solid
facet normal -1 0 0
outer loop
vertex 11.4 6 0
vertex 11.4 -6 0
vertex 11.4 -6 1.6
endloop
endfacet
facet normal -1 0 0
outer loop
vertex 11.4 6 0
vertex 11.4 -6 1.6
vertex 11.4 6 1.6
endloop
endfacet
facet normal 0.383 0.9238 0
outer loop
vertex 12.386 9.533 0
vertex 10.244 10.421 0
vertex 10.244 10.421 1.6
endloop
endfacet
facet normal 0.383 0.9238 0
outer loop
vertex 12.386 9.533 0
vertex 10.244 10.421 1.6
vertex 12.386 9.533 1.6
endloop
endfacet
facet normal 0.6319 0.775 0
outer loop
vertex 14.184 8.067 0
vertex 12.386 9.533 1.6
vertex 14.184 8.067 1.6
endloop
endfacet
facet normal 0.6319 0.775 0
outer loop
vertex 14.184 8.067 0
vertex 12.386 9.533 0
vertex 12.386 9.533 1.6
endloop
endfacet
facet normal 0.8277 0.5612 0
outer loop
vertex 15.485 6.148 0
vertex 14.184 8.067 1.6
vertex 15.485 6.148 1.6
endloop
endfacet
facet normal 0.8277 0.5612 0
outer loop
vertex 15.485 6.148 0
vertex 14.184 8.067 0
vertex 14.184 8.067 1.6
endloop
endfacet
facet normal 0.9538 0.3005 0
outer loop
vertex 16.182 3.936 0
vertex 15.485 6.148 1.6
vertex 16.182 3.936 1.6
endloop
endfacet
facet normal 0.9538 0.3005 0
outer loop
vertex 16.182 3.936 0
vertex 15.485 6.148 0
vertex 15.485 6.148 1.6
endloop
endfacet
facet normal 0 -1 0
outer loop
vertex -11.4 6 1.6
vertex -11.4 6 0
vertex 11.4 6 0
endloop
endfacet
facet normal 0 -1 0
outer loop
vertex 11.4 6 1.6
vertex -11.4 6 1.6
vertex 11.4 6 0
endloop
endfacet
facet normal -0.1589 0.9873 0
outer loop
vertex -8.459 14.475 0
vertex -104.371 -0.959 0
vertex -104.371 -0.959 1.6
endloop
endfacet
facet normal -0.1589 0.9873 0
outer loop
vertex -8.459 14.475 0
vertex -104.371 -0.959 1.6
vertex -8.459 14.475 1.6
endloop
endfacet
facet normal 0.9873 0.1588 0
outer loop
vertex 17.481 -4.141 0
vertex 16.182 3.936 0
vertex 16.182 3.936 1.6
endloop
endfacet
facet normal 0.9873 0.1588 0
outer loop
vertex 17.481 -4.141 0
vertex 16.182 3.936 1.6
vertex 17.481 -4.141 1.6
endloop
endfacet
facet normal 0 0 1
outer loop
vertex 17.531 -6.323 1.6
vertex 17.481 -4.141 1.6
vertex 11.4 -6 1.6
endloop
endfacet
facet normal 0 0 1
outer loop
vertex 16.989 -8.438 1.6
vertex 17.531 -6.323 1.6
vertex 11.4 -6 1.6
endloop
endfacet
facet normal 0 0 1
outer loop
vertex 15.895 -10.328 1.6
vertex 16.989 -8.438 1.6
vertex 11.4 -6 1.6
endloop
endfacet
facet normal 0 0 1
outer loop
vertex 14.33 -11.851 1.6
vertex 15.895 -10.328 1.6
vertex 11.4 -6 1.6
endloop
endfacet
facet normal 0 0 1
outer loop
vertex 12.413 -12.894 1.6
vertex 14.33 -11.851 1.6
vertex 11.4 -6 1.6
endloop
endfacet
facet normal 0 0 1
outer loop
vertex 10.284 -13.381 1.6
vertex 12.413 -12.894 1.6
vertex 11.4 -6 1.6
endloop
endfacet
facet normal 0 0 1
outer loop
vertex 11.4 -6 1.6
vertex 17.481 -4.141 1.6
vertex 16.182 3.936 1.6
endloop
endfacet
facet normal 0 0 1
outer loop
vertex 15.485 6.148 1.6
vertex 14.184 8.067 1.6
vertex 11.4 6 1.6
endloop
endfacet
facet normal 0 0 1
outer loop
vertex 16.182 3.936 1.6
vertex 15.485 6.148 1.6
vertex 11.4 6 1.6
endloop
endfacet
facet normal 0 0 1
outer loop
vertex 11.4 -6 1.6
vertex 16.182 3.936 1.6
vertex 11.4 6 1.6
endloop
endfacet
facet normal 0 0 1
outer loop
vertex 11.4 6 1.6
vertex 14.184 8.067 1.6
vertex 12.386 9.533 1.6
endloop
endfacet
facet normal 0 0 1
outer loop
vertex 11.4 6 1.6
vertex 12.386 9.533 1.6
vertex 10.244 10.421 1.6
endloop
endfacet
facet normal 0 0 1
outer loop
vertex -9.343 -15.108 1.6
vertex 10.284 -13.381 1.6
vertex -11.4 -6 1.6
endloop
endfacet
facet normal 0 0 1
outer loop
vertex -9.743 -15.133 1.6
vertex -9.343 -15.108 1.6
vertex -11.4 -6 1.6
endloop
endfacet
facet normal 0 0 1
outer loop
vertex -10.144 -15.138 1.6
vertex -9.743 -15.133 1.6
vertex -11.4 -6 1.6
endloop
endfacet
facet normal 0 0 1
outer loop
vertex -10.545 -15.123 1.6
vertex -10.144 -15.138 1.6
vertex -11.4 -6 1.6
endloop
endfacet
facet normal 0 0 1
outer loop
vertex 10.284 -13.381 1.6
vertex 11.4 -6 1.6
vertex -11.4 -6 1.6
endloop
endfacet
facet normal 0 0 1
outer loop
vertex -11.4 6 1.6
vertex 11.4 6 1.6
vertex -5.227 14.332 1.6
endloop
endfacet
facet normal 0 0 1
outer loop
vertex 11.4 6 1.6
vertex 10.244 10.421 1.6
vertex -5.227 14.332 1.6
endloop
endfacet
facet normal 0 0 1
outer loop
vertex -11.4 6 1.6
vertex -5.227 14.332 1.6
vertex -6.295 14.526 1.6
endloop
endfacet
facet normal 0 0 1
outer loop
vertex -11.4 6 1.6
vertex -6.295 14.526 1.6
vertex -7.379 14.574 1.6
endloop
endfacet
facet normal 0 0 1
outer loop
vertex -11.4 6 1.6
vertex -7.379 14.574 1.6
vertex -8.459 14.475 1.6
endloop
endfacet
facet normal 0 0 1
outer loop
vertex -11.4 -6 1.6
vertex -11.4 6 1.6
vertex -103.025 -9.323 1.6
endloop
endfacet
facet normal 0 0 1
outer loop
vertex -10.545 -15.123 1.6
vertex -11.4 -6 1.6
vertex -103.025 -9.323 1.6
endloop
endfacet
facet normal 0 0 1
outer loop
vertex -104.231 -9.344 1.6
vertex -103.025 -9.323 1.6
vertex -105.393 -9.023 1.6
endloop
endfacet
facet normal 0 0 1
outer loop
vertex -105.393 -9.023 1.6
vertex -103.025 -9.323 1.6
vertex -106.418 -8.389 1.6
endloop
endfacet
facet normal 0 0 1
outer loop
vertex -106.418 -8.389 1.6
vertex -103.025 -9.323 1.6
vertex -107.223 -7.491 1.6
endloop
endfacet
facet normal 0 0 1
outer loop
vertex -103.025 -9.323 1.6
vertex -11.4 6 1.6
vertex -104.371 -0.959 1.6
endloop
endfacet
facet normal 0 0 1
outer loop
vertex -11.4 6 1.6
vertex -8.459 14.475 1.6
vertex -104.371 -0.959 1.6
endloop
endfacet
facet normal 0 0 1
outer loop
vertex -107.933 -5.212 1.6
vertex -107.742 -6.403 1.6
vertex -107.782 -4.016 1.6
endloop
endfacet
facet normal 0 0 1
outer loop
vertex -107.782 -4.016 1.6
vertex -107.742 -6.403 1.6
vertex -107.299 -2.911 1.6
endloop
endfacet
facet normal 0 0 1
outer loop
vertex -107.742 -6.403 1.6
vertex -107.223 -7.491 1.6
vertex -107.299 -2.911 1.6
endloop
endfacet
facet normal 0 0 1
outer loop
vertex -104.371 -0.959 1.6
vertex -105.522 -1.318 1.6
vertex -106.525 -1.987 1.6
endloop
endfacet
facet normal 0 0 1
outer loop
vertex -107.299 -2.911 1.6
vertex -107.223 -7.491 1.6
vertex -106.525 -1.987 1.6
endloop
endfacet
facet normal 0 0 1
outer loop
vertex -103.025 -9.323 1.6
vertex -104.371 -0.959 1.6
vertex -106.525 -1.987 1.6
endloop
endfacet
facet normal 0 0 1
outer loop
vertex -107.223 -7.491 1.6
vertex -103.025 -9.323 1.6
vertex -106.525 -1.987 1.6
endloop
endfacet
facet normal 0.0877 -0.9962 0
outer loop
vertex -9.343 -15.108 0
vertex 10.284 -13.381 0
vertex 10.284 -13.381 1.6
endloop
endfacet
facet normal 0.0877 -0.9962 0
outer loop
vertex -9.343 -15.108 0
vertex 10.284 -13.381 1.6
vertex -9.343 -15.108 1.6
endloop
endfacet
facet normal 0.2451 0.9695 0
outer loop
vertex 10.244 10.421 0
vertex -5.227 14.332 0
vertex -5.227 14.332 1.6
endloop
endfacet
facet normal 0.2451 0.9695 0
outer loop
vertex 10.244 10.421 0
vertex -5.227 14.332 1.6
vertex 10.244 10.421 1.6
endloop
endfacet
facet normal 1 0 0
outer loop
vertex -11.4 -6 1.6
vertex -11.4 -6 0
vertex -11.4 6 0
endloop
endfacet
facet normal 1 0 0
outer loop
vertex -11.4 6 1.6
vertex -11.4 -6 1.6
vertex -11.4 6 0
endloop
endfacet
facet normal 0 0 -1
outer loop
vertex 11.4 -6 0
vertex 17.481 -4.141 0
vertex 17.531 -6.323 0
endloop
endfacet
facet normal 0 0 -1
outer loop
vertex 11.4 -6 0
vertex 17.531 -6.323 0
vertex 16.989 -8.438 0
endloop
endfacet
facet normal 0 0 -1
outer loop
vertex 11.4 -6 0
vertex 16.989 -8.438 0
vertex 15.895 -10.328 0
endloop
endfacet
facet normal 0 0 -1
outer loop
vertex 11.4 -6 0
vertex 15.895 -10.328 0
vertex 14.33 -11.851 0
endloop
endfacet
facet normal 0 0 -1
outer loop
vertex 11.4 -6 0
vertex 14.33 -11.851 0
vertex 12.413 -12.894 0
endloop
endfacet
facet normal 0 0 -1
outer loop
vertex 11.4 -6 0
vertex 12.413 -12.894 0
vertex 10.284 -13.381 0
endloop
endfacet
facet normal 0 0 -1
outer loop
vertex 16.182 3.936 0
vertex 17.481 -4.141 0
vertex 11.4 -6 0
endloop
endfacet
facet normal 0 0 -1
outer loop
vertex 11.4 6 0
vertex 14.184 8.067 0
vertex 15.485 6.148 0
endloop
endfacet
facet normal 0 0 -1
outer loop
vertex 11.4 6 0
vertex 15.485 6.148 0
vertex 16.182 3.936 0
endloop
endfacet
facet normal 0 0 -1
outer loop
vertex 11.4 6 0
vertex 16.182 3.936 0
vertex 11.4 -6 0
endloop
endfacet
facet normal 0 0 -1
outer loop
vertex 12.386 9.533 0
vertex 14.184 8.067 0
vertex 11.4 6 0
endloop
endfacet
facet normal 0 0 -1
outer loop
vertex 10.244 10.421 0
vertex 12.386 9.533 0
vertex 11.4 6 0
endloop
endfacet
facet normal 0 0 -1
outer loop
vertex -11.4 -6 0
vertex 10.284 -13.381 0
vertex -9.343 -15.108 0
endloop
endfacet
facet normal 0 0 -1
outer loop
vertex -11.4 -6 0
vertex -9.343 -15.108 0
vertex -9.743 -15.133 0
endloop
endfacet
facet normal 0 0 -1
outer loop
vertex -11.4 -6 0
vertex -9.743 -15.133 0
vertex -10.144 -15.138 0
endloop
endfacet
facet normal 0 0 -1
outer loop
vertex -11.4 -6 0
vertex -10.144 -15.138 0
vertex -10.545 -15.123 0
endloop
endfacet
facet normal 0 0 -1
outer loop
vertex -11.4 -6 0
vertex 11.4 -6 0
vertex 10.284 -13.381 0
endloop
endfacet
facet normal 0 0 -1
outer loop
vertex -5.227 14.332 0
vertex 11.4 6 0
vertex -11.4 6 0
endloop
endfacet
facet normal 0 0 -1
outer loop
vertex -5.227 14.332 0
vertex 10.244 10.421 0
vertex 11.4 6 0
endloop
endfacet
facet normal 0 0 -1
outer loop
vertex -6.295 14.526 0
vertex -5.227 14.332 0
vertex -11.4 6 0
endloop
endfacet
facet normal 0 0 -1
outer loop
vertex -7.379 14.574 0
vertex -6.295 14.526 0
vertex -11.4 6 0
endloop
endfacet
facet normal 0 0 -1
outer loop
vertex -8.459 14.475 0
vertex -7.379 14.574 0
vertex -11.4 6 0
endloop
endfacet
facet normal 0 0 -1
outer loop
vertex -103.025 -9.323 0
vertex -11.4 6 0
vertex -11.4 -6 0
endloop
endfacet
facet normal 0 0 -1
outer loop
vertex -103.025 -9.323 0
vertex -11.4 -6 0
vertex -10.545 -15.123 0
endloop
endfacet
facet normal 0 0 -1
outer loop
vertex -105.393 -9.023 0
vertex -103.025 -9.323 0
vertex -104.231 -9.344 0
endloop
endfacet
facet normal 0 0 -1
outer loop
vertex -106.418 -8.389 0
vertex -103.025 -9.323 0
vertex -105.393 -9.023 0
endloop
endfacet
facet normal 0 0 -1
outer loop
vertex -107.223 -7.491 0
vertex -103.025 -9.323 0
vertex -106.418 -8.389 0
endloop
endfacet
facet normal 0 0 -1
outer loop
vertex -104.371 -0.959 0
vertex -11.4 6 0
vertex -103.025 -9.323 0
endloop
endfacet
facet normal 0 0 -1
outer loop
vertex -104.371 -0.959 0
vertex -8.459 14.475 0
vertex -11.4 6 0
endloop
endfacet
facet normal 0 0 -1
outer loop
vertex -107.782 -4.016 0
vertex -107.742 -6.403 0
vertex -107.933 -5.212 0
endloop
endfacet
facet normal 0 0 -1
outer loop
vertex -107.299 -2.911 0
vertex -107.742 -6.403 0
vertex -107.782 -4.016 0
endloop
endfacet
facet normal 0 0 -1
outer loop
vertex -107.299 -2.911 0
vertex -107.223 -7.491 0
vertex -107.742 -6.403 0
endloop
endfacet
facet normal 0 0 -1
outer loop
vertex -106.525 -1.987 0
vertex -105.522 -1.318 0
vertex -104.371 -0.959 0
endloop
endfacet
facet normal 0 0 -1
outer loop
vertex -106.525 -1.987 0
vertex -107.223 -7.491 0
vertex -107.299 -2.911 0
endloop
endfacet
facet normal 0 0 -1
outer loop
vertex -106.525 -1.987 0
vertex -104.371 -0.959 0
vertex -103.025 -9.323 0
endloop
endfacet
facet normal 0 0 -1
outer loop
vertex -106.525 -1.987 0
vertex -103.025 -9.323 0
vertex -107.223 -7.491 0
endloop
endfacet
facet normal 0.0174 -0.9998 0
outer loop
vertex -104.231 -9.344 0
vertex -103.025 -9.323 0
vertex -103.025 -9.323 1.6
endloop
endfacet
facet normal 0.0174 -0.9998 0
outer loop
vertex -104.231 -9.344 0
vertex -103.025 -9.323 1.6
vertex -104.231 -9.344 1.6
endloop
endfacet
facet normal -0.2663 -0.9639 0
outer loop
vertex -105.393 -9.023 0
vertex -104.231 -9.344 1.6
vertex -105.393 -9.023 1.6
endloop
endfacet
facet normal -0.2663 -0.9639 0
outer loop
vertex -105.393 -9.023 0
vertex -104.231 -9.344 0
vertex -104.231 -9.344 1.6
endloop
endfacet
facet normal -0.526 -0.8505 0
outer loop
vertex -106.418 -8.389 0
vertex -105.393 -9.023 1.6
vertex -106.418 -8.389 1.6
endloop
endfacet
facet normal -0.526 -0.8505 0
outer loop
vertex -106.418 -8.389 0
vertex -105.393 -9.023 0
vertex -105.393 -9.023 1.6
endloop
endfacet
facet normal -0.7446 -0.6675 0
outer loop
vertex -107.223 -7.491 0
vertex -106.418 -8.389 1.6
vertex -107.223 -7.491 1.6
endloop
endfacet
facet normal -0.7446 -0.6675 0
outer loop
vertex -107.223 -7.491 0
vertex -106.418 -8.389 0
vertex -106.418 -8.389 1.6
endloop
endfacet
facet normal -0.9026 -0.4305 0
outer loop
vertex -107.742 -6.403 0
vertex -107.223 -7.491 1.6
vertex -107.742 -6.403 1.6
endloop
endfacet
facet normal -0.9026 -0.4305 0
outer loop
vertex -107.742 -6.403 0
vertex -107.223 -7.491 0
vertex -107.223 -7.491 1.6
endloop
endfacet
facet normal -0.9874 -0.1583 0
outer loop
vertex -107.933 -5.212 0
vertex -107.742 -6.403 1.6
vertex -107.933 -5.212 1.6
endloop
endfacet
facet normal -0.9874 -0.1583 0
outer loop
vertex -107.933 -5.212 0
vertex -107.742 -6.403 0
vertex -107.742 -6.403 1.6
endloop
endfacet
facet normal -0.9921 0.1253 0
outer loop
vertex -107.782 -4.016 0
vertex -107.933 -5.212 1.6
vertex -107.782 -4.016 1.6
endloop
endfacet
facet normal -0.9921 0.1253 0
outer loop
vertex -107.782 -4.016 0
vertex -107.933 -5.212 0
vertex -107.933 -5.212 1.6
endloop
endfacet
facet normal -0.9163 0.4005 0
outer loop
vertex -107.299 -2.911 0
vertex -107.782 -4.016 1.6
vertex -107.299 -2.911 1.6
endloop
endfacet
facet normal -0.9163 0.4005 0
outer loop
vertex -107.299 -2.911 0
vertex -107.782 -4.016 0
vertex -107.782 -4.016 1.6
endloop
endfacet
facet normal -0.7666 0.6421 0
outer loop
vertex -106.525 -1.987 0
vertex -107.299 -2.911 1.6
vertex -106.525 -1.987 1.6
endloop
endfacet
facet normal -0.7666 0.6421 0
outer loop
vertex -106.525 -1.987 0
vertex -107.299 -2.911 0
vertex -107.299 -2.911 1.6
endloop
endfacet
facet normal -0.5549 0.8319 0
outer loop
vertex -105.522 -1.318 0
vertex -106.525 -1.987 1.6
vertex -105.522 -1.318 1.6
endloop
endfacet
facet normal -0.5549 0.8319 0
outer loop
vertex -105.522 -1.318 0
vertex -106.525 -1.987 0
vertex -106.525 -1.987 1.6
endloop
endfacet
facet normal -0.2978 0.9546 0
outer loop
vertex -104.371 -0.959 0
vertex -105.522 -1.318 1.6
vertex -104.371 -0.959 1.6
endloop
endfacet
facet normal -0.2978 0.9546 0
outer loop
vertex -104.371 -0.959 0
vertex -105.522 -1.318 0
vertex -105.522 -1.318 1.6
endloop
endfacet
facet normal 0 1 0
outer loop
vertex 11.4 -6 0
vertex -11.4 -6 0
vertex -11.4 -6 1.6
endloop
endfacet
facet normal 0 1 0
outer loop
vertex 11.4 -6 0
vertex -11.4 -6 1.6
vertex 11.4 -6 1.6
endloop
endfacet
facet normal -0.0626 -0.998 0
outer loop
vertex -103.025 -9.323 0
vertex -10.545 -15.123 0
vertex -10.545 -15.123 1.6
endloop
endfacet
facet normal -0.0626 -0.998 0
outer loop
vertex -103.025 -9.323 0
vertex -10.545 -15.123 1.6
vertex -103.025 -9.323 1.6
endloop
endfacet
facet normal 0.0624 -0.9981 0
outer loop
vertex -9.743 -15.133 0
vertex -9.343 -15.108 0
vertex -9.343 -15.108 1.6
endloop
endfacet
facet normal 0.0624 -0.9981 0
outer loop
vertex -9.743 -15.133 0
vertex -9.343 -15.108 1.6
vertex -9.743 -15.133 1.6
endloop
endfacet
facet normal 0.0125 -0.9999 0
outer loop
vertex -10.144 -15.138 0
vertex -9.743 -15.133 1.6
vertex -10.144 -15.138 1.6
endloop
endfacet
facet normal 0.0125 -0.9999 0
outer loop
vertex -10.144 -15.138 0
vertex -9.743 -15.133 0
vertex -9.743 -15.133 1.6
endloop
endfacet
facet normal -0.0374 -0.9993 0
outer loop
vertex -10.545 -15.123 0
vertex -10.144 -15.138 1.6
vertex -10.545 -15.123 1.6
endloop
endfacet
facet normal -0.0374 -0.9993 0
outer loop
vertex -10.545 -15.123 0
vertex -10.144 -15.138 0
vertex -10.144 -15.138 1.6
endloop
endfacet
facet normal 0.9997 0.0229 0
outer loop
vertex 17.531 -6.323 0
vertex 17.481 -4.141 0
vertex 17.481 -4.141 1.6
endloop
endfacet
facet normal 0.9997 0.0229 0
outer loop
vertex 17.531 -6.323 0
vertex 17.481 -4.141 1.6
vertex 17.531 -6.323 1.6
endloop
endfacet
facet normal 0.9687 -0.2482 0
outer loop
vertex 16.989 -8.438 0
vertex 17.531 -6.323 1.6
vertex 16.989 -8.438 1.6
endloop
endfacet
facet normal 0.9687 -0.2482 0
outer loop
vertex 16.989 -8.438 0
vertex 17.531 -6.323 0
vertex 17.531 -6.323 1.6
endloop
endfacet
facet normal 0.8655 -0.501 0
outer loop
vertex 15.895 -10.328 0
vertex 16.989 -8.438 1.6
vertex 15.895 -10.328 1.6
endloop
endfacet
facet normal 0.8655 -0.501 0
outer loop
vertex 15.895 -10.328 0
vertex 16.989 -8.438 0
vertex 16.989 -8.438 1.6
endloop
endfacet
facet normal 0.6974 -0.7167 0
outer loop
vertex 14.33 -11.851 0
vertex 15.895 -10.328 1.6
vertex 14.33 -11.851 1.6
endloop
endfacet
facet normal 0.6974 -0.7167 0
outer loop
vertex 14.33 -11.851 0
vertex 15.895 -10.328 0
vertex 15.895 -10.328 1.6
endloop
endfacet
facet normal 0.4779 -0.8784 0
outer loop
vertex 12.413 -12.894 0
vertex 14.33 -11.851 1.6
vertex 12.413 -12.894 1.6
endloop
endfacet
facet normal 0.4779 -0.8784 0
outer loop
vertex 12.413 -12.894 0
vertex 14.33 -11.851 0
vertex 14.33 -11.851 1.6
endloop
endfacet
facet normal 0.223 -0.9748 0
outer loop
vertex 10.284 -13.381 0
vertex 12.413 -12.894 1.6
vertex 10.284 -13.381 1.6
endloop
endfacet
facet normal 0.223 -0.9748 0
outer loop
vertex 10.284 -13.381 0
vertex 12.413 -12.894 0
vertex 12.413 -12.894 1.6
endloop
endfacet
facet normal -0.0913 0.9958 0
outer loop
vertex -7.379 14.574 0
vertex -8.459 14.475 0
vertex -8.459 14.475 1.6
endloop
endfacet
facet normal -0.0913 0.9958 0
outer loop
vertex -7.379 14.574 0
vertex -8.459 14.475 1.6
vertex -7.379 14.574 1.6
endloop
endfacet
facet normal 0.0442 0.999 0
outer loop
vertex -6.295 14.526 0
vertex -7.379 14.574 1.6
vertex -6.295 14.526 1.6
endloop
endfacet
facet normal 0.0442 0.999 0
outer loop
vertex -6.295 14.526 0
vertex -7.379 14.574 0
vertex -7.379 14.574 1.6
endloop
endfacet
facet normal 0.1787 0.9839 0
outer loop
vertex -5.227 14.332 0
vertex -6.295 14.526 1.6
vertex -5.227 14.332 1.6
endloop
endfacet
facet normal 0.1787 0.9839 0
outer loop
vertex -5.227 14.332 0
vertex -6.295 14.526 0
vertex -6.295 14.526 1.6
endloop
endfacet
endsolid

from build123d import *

# Parameters (mm, degrees)
ESBO_O1_W                = 22.8
ESBO_O1_H                = 12
RESSALTO_EXTRUS_O1_DEPTH = 1.6


with BuildPart() as part:
    # Esboço1 → Ressalto-extrusão1 (new body)
    with BuildSketch(Plane.XY):
        with BuildLine():
            Line((-104.371088502, -0.959412185), (-8.45923057, 14.474679896))
            ThreePointArc((-8.45923057, 14.474679896), (-6.836063531, 14.568536185), (-5.227442321, 14.332277754))
            Line((-5.227442321, 14.332277754), (10.244176454, 10.420913457))
            ThreePointArc((10.244176454, 10.420913457), (14.183780118, 8.067281394), (16.181782129, 3.935931872))
            Line((16.181782129, 3.935931872), (17.481460057, -4.140638106))
            ThreePointArc((17.481460057, -4.140638106), (15.894504602, -10.327516352), (10.284415681, -13.380841154))
            Line((10.284415681, -13.380841154), (-9.34255378, -15.108149999))
            ThreePointArc((-9.34255378, -15.108149999), (-9.94330462, -15.138319582), (-10.544624147, -15.123266269))
            Line((-10.544624147, -15.123266269), (-103.02514815, -9.323470085))
            ThreePointArc((-103.02514815, -9.323470085), (-107.880147276, -5.814411311), (-104.371088502, -0.959412185))
        make_face()
        Rectangle(ESBO_O1_W, ESBO_O1_H, mode=Mode.SUBTRACT)
    extrude(amount=RESSALTO_EXTRUS_O1_DEPTH)


solid = part.part
